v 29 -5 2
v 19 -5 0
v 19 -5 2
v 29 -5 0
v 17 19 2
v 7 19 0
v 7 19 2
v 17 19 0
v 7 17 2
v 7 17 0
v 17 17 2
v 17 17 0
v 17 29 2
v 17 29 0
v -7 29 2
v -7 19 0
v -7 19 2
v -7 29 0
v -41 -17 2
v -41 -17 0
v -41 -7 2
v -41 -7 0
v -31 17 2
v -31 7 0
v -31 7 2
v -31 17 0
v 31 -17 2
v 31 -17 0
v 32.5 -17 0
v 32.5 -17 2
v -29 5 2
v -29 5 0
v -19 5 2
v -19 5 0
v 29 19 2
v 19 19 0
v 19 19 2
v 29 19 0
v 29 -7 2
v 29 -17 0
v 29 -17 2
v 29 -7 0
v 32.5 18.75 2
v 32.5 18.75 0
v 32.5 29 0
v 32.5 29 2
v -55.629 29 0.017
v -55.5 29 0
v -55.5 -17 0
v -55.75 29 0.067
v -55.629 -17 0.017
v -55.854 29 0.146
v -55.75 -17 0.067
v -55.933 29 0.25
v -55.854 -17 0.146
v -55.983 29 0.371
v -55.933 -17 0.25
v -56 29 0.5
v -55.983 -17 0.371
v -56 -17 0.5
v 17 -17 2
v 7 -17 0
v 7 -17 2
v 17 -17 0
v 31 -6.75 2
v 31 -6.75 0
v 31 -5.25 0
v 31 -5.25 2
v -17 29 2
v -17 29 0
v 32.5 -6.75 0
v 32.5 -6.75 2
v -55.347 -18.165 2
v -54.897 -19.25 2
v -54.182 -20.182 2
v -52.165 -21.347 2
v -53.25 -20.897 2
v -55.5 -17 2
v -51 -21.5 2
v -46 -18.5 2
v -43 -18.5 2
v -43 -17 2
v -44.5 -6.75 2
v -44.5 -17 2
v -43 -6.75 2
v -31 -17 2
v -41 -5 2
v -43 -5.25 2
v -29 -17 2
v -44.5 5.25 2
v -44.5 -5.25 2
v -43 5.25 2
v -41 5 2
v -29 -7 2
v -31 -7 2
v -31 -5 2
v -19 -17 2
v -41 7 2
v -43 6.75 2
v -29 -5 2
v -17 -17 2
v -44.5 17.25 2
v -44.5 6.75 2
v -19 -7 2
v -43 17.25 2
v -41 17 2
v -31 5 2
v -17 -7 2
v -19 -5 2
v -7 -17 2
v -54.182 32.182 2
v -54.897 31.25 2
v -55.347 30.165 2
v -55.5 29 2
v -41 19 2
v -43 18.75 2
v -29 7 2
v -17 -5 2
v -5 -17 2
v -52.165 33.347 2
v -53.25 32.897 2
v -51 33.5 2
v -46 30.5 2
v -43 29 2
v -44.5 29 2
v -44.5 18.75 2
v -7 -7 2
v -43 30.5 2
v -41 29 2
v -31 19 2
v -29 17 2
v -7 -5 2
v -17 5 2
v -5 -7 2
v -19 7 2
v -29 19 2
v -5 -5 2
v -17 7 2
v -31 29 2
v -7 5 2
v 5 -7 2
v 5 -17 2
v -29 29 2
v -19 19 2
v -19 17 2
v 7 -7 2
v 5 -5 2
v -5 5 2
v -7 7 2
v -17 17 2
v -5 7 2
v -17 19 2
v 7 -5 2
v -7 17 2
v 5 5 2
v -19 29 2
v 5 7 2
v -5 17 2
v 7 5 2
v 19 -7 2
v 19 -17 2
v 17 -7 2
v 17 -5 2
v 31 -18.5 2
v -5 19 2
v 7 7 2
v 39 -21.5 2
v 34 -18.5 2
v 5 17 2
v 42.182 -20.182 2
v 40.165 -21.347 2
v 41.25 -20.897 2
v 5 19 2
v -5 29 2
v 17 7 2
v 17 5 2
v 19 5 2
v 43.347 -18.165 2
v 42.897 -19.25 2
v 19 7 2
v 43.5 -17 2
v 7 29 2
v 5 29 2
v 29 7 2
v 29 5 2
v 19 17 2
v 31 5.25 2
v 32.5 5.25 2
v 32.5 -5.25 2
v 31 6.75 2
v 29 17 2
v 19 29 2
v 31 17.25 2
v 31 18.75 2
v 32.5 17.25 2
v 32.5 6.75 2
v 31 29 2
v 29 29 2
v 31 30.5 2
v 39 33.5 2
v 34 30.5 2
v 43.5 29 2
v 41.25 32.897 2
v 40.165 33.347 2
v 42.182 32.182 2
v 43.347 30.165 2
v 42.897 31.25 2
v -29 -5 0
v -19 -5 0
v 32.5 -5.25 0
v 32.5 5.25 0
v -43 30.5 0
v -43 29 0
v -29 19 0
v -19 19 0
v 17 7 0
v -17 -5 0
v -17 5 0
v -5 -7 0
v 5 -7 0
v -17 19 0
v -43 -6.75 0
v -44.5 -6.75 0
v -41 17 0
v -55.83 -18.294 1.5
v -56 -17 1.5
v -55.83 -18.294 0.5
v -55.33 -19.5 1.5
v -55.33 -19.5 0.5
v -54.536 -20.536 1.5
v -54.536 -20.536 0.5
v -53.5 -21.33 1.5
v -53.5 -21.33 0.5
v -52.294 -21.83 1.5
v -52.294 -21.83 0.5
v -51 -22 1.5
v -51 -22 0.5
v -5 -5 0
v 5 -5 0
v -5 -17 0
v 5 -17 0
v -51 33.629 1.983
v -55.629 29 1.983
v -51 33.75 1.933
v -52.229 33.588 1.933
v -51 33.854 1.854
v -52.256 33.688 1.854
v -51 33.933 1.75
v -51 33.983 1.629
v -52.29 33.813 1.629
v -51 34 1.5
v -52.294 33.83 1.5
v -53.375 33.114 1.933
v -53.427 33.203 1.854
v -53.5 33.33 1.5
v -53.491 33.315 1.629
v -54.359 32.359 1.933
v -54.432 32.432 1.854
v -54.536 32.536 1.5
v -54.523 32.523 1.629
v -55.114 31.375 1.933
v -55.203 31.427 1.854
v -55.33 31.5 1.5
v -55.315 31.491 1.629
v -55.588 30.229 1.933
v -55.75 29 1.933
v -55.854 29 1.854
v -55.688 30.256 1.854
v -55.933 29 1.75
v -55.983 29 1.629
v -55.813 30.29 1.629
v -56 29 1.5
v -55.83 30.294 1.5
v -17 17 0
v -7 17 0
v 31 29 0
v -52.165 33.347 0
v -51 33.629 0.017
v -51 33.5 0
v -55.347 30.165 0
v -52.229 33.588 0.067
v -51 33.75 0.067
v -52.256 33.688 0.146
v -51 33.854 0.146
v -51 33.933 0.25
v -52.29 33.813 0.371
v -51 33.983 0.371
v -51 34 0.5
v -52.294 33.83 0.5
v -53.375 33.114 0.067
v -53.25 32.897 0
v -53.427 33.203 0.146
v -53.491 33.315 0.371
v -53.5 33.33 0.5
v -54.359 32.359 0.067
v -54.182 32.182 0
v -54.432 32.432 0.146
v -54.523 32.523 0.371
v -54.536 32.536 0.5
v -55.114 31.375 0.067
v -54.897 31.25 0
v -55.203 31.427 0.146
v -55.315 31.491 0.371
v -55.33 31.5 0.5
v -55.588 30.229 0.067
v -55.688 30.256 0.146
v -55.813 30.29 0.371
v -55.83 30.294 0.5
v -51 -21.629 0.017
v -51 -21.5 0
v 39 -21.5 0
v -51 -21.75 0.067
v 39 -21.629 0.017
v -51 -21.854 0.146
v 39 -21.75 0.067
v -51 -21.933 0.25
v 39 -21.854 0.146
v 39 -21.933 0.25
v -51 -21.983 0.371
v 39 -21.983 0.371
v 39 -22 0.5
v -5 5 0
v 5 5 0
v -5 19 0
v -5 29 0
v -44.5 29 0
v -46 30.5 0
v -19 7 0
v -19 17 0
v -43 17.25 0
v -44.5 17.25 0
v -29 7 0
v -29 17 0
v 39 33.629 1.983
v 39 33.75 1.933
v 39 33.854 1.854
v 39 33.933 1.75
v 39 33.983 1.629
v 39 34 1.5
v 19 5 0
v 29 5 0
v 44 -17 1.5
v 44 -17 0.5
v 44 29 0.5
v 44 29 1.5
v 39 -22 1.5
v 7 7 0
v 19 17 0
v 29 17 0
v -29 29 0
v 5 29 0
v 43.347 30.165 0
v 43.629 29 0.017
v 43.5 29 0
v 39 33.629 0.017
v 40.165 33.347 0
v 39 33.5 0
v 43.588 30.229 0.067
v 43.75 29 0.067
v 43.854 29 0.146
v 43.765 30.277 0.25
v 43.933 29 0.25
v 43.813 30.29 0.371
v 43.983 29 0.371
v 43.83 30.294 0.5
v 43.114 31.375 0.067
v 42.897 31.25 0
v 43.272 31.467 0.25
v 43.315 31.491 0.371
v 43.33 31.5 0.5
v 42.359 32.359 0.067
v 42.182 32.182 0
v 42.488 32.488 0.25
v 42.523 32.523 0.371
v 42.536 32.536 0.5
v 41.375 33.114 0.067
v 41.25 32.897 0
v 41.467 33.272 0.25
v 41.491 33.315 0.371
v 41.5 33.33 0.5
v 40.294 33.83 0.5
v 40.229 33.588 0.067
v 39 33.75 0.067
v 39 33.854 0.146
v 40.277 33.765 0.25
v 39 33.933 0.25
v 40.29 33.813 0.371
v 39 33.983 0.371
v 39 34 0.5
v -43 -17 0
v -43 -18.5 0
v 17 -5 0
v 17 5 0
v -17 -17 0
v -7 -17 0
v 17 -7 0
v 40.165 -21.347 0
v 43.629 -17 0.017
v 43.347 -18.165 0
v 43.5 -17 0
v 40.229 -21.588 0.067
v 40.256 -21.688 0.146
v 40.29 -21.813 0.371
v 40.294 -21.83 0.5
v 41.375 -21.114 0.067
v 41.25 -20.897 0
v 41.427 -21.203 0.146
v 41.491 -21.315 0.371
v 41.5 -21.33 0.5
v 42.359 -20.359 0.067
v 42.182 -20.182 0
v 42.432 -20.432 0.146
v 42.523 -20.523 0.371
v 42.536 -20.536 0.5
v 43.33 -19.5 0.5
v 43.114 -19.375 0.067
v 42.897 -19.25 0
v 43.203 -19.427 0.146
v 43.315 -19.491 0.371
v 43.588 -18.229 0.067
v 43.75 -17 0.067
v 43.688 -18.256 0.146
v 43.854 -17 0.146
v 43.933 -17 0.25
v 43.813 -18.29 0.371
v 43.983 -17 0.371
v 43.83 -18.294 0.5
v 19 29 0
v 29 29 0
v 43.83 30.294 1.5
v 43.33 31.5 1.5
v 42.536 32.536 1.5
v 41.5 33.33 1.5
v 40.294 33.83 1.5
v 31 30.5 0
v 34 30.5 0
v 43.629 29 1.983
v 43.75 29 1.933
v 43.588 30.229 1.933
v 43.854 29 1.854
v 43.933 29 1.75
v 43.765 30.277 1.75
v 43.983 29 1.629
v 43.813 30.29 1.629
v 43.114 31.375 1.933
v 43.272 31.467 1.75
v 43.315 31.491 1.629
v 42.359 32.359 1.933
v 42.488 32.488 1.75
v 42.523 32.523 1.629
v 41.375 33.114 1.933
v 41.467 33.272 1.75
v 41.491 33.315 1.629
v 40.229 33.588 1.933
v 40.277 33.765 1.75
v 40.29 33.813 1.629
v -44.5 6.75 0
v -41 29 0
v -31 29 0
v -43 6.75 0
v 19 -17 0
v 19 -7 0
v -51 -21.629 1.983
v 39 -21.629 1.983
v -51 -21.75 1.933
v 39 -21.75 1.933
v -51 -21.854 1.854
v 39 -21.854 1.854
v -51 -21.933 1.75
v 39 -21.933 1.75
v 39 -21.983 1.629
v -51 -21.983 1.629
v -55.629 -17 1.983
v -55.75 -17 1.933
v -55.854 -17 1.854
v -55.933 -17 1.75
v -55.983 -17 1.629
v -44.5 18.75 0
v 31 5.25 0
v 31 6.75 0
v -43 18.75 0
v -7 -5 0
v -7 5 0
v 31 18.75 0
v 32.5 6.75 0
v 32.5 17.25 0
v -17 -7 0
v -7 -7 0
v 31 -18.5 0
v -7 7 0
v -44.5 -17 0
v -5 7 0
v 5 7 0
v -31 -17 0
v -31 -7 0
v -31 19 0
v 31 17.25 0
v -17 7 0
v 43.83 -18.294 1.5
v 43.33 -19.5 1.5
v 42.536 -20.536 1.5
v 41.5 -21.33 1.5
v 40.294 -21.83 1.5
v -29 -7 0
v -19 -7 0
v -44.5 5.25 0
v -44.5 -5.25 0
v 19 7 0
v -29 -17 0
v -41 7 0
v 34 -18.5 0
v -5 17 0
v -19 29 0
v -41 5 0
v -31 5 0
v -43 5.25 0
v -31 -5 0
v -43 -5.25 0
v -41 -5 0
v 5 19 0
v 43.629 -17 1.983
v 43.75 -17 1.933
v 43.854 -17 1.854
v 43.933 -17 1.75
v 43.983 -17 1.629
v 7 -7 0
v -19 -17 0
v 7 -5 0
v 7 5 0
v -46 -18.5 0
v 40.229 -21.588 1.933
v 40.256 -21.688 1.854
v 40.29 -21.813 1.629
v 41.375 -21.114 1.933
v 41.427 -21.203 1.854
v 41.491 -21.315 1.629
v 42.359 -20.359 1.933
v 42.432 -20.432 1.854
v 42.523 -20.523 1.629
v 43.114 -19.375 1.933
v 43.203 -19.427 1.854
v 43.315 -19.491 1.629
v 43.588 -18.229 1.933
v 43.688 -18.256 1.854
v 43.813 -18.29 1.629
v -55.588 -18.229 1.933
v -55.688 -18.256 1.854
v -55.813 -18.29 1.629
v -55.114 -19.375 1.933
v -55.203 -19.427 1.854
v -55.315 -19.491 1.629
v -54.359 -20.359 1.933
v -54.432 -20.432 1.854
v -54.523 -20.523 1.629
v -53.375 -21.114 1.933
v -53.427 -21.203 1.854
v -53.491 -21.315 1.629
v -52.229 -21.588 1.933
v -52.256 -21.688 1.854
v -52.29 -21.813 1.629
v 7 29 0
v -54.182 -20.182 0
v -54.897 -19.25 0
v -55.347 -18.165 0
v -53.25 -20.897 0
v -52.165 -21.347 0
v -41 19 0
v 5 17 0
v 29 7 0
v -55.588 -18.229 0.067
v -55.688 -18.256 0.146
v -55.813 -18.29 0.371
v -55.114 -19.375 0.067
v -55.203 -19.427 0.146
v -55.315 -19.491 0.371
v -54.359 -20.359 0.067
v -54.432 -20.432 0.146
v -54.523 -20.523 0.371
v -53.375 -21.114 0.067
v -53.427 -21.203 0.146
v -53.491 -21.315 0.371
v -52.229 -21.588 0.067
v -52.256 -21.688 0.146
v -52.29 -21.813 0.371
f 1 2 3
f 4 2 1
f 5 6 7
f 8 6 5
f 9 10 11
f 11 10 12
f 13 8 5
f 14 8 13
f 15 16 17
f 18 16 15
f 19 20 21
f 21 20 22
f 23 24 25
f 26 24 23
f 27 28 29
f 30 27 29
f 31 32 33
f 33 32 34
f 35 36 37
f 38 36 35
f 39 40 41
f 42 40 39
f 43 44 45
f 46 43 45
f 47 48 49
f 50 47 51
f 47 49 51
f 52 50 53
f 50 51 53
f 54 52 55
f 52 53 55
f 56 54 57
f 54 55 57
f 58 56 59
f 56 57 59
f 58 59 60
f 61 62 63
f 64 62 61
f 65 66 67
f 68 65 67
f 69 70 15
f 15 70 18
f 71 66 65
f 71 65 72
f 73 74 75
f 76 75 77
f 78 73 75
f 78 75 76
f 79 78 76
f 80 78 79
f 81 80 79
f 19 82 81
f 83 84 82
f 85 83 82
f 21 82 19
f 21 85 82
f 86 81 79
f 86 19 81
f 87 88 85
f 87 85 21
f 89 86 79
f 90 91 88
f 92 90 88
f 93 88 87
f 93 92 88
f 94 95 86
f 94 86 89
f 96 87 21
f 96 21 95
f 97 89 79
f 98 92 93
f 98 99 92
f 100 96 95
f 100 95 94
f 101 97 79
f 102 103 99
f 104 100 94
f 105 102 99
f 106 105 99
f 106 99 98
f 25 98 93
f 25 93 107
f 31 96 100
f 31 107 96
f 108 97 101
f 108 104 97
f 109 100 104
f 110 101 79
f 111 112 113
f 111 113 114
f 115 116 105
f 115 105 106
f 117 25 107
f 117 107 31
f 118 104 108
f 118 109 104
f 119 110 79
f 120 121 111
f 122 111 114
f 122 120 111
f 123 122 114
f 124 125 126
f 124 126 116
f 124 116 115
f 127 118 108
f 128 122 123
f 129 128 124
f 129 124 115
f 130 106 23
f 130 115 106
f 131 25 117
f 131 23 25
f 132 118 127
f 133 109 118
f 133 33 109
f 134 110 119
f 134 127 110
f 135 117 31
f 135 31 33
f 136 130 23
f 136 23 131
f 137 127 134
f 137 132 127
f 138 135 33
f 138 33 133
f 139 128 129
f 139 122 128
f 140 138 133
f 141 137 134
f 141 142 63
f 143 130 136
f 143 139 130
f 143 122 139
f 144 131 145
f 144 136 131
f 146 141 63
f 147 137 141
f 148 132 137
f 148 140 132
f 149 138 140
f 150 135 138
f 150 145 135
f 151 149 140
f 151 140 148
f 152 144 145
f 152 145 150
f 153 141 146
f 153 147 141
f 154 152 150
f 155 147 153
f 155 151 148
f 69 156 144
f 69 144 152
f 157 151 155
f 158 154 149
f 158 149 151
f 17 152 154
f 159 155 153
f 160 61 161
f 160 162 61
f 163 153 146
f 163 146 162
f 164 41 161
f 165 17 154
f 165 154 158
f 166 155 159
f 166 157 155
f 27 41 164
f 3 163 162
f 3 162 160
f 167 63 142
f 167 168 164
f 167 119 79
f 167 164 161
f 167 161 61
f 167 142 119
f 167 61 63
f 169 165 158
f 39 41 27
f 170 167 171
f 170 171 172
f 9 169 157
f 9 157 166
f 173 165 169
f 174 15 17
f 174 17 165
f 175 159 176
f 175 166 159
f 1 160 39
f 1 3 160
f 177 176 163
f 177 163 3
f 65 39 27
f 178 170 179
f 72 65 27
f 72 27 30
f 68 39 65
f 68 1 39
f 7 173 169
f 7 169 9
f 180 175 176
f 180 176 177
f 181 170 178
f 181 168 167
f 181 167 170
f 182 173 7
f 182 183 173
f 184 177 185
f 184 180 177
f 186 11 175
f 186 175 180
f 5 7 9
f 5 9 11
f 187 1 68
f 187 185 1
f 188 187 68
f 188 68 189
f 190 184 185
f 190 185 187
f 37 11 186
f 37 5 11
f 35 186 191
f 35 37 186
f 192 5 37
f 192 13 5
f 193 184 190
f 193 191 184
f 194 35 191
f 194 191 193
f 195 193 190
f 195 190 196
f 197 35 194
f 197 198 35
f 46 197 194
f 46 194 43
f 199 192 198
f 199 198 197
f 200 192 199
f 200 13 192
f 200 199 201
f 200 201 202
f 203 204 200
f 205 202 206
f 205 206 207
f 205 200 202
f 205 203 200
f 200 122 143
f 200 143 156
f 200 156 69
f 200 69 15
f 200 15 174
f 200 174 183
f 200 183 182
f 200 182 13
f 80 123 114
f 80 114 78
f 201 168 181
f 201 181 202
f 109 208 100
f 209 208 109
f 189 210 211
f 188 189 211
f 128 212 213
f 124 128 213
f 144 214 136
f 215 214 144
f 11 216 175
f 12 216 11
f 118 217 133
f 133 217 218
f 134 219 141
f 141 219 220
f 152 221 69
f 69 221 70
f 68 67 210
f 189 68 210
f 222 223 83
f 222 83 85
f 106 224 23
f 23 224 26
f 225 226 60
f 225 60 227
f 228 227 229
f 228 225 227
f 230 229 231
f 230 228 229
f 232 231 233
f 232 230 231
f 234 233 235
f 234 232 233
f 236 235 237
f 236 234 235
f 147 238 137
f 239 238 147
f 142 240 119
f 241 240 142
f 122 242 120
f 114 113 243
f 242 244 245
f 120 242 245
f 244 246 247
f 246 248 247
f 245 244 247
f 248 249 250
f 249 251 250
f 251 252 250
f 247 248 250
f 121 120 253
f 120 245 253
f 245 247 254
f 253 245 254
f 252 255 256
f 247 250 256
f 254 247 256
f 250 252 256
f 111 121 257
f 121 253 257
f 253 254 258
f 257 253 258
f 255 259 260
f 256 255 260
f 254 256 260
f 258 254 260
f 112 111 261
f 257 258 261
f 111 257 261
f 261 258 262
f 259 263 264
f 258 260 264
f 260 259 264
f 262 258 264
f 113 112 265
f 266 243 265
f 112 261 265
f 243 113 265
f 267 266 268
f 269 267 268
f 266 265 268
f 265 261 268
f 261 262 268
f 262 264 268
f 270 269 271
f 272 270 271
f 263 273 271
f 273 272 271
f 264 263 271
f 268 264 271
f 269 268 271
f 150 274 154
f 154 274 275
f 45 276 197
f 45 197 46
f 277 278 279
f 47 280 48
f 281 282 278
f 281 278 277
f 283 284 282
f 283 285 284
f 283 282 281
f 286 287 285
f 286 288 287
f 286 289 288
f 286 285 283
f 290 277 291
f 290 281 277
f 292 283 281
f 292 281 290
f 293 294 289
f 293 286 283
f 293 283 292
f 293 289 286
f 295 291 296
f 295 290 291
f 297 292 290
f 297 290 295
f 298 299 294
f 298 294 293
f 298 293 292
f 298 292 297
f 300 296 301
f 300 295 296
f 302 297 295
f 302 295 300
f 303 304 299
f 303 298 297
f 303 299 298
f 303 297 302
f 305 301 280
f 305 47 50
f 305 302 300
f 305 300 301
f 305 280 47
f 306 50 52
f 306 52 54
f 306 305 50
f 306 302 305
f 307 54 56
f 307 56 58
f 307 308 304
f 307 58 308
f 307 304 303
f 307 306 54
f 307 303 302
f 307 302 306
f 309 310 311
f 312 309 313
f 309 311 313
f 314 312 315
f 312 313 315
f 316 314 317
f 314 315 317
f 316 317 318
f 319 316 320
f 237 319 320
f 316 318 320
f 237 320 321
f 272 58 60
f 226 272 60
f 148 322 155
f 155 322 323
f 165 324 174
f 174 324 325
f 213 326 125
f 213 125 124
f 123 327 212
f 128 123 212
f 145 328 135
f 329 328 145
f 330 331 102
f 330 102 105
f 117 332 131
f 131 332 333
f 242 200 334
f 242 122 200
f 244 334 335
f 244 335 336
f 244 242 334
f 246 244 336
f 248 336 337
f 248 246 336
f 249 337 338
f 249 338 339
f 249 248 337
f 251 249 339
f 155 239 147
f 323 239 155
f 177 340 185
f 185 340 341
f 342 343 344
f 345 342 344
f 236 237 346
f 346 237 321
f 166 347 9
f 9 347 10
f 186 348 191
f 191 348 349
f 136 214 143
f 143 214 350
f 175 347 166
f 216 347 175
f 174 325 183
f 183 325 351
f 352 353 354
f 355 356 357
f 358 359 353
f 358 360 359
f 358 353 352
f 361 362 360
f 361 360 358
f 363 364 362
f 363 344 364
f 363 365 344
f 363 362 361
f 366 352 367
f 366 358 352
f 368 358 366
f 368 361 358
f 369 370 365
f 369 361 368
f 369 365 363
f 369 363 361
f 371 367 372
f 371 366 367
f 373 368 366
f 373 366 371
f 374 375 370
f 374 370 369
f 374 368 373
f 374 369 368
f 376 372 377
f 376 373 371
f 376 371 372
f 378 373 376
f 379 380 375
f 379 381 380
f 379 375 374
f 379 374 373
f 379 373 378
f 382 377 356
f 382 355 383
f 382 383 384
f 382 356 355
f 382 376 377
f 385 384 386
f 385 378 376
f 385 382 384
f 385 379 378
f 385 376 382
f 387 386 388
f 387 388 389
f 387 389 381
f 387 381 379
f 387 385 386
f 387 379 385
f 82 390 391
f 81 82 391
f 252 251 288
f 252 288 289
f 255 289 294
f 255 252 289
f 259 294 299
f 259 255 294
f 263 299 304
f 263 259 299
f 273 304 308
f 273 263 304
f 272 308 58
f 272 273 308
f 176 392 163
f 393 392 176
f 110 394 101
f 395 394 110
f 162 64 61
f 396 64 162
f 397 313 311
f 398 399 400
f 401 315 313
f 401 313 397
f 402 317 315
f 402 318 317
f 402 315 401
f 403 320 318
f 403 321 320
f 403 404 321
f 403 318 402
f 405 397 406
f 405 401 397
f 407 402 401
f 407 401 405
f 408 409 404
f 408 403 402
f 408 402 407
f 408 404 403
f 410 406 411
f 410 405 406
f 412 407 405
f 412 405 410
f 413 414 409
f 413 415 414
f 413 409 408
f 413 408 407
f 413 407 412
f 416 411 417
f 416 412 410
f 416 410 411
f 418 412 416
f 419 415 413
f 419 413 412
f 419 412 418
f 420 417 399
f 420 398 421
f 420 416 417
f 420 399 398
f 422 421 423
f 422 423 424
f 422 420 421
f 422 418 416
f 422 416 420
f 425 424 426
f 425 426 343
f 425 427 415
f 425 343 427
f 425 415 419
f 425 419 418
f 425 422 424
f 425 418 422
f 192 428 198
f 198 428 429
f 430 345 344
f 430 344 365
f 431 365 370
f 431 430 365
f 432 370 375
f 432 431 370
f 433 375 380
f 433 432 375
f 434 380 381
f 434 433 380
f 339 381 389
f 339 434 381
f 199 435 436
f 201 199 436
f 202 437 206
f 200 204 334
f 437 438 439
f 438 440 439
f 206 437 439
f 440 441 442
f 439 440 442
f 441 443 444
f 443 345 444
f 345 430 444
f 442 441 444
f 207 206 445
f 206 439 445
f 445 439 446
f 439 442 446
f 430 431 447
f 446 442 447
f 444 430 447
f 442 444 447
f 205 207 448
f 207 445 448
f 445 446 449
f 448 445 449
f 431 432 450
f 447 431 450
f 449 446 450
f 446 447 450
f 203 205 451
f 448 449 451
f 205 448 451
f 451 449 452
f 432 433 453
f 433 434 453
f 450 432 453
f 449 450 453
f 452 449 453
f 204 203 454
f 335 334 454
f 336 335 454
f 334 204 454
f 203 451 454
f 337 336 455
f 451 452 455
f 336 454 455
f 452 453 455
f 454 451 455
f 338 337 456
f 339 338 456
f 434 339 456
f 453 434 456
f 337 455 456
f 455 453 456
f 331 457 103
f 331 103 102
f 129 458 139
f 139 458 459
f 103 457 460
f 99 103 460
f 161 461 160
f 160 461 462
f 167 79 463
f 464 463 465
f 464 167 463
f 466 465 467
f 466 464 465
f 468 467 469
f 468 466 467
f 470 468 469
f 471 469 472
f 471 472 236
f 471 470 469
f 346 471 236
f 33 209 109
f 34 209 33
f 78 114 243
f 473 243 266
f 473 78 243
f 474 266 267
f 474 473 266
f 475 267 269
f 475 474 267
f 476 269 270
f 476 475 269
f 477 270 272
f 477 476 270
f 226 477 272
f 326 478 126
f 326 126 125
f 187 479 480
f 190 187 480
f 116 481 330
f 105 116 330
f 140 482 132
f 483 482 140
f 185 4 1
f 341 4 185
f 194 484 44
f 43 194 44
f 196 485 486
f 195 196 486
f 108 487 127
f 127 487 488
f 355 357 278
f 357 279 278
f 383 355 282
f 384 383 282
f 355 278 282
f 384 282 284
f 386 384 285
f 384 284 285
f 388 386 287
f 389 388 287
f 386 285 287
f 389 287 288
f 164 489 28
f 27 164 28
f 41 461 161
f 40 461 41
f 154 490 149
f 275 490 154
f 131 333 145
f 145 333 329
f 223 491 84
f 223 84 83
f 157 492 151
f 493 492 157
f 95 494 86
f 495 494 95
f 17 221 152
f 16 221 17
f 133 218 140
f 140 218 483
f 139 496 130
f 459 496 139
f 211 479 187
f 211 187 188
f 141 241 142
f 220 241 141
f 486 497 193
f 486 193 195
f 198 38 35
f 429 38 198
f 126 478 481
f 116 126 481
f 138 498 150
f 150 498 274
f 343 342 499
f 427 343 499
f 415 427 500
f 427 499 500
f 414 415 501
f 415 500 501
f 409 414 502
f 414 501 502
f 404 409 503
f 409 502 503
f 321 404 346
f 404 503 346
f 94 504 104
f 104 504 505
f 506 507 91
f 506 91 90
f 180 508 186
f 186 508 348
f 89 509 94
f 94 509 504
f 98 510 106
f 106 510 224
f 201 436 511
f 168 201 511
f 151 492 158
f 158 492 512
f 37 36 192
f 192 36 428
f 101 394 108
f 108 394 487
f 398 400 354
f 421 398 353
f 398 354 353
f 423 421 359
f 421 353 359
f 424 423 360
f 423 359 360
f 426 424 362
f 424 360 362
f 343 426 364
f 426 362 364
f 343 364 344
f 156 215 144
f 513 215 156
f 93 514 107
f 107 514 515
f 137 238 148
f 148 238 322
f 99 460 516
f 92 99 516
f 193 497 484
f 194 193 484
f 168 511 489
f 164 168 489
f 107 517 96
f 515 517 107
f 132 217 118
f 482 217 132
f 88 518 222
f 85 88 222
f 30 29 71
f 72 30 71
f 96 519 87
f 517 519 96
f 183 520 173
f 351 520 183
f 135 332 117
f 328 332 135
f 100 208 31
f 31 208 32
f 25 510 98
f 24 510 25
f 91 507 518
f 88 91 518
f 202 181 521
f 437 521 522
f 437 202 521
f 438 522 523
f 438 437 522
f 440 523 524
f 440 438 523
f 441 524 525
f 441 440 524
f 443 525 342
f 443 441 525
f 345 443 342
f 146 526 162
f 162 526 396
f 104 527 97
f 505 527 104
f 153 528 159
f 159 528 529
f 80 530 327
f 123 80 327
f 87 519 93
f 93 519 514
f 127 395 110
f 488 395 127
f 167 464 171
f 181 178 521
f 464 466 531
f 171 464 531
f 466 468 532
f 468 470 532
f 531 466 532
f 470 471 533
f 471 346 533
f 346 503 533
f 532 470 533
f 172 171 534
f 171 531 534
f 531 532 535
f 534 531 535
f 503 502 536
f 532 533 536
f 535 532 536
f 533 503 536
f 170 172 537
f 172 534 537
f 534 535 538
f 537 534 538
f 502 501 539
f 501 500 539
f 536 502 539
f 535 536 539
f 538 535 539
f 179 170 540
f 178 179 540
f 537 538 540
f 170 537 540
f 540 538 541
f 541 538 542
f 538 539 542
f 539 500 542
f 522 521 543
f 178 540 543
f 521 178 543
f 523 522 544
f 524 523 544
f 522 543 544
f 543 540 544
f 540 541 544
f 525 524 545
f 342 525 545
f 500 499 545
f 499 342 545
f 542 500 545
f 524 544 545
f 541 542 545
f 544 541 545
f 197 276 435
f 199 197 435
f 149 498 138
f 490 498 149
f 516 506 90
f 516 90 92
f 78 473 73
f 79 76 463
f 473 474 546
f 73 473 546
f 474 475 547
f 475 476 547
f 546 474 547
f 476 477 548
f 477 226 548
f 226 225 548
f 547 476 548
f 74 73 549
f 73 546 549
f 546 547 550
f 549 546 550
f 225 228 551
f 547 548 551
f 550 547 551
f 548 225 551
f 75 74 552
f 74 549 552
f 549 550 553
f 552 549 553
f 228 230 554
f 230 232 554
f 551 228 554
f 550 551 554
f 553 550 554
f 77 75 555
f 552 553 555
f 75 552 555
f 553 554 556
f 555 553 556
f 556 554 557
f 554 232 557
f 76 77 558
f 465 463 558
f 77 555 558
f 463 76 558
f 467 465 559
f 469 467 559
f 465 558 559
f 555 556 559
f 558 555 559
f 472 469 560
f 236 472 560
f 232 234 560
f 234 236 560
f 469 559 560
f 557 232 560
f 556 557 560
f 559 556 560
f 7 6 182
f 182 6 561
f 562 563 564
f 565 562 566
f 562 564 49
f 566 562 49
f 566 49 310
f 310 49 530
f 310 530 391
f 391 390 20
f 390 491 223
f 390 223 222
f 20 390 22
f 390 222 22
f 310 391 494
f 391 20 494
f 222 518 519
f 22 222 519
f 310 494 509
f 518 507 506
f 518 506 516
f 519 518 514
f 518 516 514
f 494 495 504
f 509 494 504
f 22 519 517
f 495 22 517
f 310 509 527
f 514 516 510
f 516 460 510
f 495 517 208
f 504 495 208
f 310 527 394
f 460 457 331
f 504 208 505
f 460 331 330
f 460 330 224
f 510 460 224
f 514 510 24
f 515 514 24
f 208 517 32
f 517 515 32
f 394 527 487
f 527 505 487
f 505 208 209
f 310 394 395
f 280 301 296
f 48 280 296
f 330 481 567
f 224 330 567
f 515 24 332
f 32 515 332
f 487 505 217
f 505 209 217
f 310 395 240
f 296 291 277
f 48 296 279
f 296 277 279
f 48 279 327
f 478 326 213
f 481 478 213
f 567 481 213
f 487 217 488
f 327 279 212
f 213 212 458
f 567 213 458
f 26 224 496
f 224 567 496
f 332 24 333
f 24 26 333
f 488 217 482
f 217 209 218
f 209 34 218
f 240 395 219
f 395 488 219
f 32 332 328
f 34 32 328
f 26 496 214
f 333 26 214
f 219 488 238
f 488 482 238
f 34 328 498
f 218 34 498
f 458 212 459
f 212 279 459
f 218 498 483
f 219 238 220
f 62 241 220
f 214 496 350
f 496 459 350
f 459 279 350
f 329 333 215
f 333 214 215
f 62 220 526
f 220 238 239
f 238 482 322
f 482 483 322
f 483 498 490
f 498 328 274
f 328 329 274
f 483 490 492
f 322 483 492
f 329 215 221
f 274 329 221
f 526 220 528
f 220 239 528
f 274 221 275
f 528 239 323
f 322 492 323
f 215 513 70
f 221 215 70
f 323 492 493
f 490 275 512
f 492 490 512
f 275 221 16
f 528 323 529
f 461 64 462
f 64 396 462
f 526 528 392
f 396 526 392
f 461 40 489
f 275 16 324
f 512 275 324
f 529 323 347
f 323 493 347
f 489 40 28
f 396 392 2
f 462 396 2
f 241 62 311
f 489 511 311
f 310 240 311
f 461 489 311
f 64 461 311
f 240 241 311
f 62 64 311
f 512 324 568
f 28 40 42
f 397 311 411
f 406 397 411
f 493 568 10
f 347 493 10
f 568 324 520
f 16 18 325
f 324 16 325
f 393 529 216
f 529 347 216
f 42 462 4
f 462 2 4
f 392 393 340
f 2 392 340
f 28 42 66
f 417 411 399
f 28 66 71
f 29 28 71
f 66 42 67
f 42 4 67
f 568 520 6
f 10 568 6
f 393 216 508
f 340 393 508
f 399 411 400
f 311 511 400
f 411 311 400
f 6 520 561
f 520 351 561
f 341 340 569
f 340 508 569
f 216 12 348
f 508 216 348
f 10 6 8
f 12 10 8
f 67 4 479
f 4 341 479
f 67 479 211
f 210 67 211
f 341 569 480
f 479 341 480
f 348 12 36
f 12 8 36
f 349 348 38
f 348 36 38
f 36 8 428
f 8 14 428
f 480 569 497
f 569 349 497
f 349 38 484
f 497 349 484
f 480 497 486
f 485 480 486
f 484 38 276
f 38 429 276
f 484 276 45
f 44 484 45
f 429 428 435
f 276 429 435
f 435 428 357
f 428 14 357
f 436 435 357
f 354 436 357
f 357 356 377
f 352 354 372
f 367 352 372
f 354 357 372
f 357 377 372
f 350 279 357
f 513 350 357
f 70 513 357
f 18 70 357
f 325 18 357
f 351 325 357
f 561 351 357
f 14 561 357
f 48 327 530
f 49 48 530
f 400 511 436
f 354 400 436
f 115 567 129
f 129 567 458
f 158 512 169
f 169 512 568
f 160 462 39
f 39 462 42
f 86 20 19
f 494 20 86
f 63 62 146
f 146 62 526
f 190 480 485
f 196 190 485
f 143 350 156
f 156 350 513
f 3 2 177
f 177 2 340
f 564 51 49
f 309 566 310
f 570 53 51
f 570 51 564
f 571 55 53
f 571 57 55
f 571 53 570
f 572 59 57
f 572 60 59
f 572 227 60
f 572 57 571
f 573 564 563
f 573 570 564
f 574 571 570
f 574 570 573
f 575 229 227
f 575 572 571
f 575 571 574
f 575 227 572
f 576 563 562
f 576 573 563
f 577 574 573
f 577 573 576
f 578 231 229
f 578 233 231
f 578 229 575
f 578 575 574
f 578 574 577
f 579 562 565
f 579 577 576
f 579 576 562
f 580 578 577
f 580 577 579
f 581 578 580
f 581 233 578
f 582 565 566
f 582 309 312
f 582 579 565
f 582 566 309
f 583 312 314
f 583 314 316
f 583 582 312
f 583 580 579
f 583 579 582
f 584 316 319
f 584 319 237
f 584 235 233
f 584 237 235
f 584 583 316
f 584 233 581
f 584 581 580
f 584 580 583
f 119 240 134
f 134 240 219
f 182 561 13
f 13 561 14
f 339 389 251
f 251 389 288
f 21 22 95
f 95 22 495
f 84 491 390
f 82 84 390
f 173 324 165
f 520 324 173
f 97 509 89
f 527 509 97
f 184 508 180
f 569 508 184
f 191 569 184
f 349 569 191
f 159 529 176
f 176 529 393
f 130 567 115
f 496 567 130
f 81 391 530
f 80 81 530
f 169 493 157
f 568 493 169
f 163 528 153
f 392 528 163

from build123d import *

# Parameters (mm, degrees)
F0_W     = 10
F0_H     = 10
F0_H_2   = 46
F0_W_2   = 1.5
F0_H_3   = 10.5
F0_H_4   = 10.25
F1_DEPTH = 2
F2_R     = 5
F4_R     = 0.5


# Not quite as in the source:
# - two fillets or chamfers of one size are made in one step


with BuildPart() as f1:
    # F0 (on Top) → F1 (new body)
    with BuildSketch(Plane.XY):
        Polygon((-43, 29), (-41, 29), (-41, 34), (-46, 34), (-46, 30.5), (-43, 30.5), align=None)
        Polygon((-41, 34), (-41, 29), (-43, 29), (-43, 18.75), (-43, 17.25), (-43, 6.75), (-43, 5.25), (-43, -5.25), (-43, -6.75), (-43, -17), (-43, -18.5), (-46, -18.5), (-46, -22), (29, -22), (29, -17), (31, -17), (31, -6.75), (31, -5.25), (31, 5.25), (31, 6.75), (31, 17.25), (31, 18.75), (31, 29), (31, 30.5), (34, 30.5), (34, 34), align=None)
        with Locations((-36, -12)):
            Rectangle(F0_W, F0_H, mode=Mode.SUBTRACT)
        with Locations((-24, -12)):
            Rectangle(F0_W, F0_H, mode=Mode.SUBTRACT)
        with Locations((-12, -12)):
            Rectangle(F0_W, F0_H, mode=Mode.SUBTRACT)
        with Locations((-36, 0)):
            Rectangle(F0_W, F0_H, mode=Mode.SUBTRACT)
        with Locations((-24, 0)):
            Rectangle(F0_W, F0_H, mode=Mode.SUBTRACT)
        with Locations((-12, 0)):
            Rectangle(F0_W, F0_H, mode=Mode.SUBTRACT)
        with Locations((0, -12)):
            Rectangle(F0_W, F0_H, mode=Mode.SUBTRACT)
        with Locations((12, -12)):
            Rectangle(F0_W, F0_H, mode=Mode.SUBTRACT)
        with Locations((24, -12)):
            Rectangle(F0_W, F0_H, mode=Mode.SUBTRACT)
        Rectangle(F0_W, F0_H, mode=Mode.SUBTRACT)
        with Locations((12, 0)):
            Rectangle(F0_W, F0_H, mode=Mode.SUBTRACT)
        with Locations((24, 0)):
            Rectangle(F0_W, F0_H, mode=Mode.SUBTRACT)
        with Locations((-36, 12)):
            Rectangle(F0_W, F0_H, mode=Mode.SUBTRACT)
        with Locations((-24, 12)):
            Rectangle(F0_W, F0_H, mode=Mode.SUBTRACT)
        with Locations((-12, 12)):
            Rectangle(F0_W, F0_H, mode=Mode.SUBTRACT)
        with Locations((-36, 24)):
            Rectangle(F0_W, F0_H, mode=Mode.SUBTRACT)
        with Locations((-24, 24)):
            Rectangle(F0_W, F0_H, mode=Mode.SUBTRACT)
        with Locations((-12, 24)):
            Rectangle(F0_W, F0_H, mode=Mode.SUBTRACT)
        with Locations((0, 12)):
            Rectangle(F0_W, F0_H, mode=Mode.SUBTRACT)
        with Locations((12, 12)):
            Rectangle(F0_W, F0_H, mode=Mode.SUBTRACT)
        with Locations((24, 12)):
            Rectangle(F0_W, F0_H, mode=Mode.SUBTRACT)
        with Locations((0, 24)):
            Rectangle(F0_W, F0_H, mode=Mode.SUBTRACT)
        with Locations((12, 24)):
            Rectangle(F0_W, F0_H, mode=Mode.SUBTRACT)
        with Locations((24, 24)):
            Rectangle(F0_W, F0_H, mode=Mode.SUBTRACT)
        Polygon((44, 34), (34, 34), (34, 30.5), (34, 29), (44, 29), align=None)
        with Locations((39, 6)):
            Rectangle(F0_W, F0_H_2)
        Polygon((44, -22), (44, -17), (34, -17), (34, -18.5), (34, -22), align=None)
        Polygon((34, -22), (34, -18.5), (31, -18.5), (31, -17), (29, -17), (29, -22), align=None)
        with Locations((31.75, 0)):
            Rectangle(F0_W_2, F0_H_3)
        with Locations((31.75, 12)):
            Rectangle(F0_W_2, F0_H_3)
        with Locations((-51, 6)):
            Rectangle(F0_W, F0_H_2)
        Polygon((-46, -18.5), (-46, -17), (-56, -17), (-56, -22), (-46, -22), align=None)
        Polygon((-46, 30.5), (-46, 34), (-56, 34), (-56, 29), (-46, 29), align=None)
        with Locations((-43.75, 23.875)):
            Rectangle(F0_W_2, F0_H_4)
        with Locations((-43.75, 12)):
            Rectangle(F0_W_2, F0_H_3)
        with Locations((-43.75, 0)):
            Rectangle(F0_W_2, F0_H_3)
        with Locations((-43.75, -11.875)):
            Rectangle(F0_W_2, F0_H_4)
        with Locations((31.75, 23.875)):
            Rectangle(F0_W_2, F0_H_4)
        with Locations((31.75, -11.875)):
            Rectangle(F0_W_2, F0_H_4)
    extrude(amount=F1_DEPTH)

    # F2
    f2_edges = [f1.edges().sort_by_distance(p)[0] for p in [
        (44, -22, 1),
        (44, 34, 1),
        (-56, 34, 1),
        (-56, -22, 1),
    ]]
    fillet(f2_edges, radius=F2_R)

    # F4
    f4_edges = [f1.edges().sort_by_distance(p)[0] for p in [
        (-6, 34, 2),
        (-6, 34, 0),
        (-51, 34, 1),
        (39, 34, 1),
        (44, 6, 2),
        (44, 29, 1),
        (44, 6, 0),
        (42.535534, 32.535534, 2),
        (-6, -22, 2),
        (42.535534, 32.535534, 0),
        (-6, -22, 0),
        (-56, 6, 2),
        (-54.535534, 32.535534, 2),
        (-56, 6, 0),
        (-56, 29, 1),
        (-54.535534, 32.535534, 0),
        (42.535534, -20.535534, 0),
        (-54.535534, -20.535534, 0),
        (42.535534, -20.535534, 2),
        (-54.535534, -20.535534, 2),
    ]]
    fillet(f4_edges, radius=F4_R)


solid = f1.part
